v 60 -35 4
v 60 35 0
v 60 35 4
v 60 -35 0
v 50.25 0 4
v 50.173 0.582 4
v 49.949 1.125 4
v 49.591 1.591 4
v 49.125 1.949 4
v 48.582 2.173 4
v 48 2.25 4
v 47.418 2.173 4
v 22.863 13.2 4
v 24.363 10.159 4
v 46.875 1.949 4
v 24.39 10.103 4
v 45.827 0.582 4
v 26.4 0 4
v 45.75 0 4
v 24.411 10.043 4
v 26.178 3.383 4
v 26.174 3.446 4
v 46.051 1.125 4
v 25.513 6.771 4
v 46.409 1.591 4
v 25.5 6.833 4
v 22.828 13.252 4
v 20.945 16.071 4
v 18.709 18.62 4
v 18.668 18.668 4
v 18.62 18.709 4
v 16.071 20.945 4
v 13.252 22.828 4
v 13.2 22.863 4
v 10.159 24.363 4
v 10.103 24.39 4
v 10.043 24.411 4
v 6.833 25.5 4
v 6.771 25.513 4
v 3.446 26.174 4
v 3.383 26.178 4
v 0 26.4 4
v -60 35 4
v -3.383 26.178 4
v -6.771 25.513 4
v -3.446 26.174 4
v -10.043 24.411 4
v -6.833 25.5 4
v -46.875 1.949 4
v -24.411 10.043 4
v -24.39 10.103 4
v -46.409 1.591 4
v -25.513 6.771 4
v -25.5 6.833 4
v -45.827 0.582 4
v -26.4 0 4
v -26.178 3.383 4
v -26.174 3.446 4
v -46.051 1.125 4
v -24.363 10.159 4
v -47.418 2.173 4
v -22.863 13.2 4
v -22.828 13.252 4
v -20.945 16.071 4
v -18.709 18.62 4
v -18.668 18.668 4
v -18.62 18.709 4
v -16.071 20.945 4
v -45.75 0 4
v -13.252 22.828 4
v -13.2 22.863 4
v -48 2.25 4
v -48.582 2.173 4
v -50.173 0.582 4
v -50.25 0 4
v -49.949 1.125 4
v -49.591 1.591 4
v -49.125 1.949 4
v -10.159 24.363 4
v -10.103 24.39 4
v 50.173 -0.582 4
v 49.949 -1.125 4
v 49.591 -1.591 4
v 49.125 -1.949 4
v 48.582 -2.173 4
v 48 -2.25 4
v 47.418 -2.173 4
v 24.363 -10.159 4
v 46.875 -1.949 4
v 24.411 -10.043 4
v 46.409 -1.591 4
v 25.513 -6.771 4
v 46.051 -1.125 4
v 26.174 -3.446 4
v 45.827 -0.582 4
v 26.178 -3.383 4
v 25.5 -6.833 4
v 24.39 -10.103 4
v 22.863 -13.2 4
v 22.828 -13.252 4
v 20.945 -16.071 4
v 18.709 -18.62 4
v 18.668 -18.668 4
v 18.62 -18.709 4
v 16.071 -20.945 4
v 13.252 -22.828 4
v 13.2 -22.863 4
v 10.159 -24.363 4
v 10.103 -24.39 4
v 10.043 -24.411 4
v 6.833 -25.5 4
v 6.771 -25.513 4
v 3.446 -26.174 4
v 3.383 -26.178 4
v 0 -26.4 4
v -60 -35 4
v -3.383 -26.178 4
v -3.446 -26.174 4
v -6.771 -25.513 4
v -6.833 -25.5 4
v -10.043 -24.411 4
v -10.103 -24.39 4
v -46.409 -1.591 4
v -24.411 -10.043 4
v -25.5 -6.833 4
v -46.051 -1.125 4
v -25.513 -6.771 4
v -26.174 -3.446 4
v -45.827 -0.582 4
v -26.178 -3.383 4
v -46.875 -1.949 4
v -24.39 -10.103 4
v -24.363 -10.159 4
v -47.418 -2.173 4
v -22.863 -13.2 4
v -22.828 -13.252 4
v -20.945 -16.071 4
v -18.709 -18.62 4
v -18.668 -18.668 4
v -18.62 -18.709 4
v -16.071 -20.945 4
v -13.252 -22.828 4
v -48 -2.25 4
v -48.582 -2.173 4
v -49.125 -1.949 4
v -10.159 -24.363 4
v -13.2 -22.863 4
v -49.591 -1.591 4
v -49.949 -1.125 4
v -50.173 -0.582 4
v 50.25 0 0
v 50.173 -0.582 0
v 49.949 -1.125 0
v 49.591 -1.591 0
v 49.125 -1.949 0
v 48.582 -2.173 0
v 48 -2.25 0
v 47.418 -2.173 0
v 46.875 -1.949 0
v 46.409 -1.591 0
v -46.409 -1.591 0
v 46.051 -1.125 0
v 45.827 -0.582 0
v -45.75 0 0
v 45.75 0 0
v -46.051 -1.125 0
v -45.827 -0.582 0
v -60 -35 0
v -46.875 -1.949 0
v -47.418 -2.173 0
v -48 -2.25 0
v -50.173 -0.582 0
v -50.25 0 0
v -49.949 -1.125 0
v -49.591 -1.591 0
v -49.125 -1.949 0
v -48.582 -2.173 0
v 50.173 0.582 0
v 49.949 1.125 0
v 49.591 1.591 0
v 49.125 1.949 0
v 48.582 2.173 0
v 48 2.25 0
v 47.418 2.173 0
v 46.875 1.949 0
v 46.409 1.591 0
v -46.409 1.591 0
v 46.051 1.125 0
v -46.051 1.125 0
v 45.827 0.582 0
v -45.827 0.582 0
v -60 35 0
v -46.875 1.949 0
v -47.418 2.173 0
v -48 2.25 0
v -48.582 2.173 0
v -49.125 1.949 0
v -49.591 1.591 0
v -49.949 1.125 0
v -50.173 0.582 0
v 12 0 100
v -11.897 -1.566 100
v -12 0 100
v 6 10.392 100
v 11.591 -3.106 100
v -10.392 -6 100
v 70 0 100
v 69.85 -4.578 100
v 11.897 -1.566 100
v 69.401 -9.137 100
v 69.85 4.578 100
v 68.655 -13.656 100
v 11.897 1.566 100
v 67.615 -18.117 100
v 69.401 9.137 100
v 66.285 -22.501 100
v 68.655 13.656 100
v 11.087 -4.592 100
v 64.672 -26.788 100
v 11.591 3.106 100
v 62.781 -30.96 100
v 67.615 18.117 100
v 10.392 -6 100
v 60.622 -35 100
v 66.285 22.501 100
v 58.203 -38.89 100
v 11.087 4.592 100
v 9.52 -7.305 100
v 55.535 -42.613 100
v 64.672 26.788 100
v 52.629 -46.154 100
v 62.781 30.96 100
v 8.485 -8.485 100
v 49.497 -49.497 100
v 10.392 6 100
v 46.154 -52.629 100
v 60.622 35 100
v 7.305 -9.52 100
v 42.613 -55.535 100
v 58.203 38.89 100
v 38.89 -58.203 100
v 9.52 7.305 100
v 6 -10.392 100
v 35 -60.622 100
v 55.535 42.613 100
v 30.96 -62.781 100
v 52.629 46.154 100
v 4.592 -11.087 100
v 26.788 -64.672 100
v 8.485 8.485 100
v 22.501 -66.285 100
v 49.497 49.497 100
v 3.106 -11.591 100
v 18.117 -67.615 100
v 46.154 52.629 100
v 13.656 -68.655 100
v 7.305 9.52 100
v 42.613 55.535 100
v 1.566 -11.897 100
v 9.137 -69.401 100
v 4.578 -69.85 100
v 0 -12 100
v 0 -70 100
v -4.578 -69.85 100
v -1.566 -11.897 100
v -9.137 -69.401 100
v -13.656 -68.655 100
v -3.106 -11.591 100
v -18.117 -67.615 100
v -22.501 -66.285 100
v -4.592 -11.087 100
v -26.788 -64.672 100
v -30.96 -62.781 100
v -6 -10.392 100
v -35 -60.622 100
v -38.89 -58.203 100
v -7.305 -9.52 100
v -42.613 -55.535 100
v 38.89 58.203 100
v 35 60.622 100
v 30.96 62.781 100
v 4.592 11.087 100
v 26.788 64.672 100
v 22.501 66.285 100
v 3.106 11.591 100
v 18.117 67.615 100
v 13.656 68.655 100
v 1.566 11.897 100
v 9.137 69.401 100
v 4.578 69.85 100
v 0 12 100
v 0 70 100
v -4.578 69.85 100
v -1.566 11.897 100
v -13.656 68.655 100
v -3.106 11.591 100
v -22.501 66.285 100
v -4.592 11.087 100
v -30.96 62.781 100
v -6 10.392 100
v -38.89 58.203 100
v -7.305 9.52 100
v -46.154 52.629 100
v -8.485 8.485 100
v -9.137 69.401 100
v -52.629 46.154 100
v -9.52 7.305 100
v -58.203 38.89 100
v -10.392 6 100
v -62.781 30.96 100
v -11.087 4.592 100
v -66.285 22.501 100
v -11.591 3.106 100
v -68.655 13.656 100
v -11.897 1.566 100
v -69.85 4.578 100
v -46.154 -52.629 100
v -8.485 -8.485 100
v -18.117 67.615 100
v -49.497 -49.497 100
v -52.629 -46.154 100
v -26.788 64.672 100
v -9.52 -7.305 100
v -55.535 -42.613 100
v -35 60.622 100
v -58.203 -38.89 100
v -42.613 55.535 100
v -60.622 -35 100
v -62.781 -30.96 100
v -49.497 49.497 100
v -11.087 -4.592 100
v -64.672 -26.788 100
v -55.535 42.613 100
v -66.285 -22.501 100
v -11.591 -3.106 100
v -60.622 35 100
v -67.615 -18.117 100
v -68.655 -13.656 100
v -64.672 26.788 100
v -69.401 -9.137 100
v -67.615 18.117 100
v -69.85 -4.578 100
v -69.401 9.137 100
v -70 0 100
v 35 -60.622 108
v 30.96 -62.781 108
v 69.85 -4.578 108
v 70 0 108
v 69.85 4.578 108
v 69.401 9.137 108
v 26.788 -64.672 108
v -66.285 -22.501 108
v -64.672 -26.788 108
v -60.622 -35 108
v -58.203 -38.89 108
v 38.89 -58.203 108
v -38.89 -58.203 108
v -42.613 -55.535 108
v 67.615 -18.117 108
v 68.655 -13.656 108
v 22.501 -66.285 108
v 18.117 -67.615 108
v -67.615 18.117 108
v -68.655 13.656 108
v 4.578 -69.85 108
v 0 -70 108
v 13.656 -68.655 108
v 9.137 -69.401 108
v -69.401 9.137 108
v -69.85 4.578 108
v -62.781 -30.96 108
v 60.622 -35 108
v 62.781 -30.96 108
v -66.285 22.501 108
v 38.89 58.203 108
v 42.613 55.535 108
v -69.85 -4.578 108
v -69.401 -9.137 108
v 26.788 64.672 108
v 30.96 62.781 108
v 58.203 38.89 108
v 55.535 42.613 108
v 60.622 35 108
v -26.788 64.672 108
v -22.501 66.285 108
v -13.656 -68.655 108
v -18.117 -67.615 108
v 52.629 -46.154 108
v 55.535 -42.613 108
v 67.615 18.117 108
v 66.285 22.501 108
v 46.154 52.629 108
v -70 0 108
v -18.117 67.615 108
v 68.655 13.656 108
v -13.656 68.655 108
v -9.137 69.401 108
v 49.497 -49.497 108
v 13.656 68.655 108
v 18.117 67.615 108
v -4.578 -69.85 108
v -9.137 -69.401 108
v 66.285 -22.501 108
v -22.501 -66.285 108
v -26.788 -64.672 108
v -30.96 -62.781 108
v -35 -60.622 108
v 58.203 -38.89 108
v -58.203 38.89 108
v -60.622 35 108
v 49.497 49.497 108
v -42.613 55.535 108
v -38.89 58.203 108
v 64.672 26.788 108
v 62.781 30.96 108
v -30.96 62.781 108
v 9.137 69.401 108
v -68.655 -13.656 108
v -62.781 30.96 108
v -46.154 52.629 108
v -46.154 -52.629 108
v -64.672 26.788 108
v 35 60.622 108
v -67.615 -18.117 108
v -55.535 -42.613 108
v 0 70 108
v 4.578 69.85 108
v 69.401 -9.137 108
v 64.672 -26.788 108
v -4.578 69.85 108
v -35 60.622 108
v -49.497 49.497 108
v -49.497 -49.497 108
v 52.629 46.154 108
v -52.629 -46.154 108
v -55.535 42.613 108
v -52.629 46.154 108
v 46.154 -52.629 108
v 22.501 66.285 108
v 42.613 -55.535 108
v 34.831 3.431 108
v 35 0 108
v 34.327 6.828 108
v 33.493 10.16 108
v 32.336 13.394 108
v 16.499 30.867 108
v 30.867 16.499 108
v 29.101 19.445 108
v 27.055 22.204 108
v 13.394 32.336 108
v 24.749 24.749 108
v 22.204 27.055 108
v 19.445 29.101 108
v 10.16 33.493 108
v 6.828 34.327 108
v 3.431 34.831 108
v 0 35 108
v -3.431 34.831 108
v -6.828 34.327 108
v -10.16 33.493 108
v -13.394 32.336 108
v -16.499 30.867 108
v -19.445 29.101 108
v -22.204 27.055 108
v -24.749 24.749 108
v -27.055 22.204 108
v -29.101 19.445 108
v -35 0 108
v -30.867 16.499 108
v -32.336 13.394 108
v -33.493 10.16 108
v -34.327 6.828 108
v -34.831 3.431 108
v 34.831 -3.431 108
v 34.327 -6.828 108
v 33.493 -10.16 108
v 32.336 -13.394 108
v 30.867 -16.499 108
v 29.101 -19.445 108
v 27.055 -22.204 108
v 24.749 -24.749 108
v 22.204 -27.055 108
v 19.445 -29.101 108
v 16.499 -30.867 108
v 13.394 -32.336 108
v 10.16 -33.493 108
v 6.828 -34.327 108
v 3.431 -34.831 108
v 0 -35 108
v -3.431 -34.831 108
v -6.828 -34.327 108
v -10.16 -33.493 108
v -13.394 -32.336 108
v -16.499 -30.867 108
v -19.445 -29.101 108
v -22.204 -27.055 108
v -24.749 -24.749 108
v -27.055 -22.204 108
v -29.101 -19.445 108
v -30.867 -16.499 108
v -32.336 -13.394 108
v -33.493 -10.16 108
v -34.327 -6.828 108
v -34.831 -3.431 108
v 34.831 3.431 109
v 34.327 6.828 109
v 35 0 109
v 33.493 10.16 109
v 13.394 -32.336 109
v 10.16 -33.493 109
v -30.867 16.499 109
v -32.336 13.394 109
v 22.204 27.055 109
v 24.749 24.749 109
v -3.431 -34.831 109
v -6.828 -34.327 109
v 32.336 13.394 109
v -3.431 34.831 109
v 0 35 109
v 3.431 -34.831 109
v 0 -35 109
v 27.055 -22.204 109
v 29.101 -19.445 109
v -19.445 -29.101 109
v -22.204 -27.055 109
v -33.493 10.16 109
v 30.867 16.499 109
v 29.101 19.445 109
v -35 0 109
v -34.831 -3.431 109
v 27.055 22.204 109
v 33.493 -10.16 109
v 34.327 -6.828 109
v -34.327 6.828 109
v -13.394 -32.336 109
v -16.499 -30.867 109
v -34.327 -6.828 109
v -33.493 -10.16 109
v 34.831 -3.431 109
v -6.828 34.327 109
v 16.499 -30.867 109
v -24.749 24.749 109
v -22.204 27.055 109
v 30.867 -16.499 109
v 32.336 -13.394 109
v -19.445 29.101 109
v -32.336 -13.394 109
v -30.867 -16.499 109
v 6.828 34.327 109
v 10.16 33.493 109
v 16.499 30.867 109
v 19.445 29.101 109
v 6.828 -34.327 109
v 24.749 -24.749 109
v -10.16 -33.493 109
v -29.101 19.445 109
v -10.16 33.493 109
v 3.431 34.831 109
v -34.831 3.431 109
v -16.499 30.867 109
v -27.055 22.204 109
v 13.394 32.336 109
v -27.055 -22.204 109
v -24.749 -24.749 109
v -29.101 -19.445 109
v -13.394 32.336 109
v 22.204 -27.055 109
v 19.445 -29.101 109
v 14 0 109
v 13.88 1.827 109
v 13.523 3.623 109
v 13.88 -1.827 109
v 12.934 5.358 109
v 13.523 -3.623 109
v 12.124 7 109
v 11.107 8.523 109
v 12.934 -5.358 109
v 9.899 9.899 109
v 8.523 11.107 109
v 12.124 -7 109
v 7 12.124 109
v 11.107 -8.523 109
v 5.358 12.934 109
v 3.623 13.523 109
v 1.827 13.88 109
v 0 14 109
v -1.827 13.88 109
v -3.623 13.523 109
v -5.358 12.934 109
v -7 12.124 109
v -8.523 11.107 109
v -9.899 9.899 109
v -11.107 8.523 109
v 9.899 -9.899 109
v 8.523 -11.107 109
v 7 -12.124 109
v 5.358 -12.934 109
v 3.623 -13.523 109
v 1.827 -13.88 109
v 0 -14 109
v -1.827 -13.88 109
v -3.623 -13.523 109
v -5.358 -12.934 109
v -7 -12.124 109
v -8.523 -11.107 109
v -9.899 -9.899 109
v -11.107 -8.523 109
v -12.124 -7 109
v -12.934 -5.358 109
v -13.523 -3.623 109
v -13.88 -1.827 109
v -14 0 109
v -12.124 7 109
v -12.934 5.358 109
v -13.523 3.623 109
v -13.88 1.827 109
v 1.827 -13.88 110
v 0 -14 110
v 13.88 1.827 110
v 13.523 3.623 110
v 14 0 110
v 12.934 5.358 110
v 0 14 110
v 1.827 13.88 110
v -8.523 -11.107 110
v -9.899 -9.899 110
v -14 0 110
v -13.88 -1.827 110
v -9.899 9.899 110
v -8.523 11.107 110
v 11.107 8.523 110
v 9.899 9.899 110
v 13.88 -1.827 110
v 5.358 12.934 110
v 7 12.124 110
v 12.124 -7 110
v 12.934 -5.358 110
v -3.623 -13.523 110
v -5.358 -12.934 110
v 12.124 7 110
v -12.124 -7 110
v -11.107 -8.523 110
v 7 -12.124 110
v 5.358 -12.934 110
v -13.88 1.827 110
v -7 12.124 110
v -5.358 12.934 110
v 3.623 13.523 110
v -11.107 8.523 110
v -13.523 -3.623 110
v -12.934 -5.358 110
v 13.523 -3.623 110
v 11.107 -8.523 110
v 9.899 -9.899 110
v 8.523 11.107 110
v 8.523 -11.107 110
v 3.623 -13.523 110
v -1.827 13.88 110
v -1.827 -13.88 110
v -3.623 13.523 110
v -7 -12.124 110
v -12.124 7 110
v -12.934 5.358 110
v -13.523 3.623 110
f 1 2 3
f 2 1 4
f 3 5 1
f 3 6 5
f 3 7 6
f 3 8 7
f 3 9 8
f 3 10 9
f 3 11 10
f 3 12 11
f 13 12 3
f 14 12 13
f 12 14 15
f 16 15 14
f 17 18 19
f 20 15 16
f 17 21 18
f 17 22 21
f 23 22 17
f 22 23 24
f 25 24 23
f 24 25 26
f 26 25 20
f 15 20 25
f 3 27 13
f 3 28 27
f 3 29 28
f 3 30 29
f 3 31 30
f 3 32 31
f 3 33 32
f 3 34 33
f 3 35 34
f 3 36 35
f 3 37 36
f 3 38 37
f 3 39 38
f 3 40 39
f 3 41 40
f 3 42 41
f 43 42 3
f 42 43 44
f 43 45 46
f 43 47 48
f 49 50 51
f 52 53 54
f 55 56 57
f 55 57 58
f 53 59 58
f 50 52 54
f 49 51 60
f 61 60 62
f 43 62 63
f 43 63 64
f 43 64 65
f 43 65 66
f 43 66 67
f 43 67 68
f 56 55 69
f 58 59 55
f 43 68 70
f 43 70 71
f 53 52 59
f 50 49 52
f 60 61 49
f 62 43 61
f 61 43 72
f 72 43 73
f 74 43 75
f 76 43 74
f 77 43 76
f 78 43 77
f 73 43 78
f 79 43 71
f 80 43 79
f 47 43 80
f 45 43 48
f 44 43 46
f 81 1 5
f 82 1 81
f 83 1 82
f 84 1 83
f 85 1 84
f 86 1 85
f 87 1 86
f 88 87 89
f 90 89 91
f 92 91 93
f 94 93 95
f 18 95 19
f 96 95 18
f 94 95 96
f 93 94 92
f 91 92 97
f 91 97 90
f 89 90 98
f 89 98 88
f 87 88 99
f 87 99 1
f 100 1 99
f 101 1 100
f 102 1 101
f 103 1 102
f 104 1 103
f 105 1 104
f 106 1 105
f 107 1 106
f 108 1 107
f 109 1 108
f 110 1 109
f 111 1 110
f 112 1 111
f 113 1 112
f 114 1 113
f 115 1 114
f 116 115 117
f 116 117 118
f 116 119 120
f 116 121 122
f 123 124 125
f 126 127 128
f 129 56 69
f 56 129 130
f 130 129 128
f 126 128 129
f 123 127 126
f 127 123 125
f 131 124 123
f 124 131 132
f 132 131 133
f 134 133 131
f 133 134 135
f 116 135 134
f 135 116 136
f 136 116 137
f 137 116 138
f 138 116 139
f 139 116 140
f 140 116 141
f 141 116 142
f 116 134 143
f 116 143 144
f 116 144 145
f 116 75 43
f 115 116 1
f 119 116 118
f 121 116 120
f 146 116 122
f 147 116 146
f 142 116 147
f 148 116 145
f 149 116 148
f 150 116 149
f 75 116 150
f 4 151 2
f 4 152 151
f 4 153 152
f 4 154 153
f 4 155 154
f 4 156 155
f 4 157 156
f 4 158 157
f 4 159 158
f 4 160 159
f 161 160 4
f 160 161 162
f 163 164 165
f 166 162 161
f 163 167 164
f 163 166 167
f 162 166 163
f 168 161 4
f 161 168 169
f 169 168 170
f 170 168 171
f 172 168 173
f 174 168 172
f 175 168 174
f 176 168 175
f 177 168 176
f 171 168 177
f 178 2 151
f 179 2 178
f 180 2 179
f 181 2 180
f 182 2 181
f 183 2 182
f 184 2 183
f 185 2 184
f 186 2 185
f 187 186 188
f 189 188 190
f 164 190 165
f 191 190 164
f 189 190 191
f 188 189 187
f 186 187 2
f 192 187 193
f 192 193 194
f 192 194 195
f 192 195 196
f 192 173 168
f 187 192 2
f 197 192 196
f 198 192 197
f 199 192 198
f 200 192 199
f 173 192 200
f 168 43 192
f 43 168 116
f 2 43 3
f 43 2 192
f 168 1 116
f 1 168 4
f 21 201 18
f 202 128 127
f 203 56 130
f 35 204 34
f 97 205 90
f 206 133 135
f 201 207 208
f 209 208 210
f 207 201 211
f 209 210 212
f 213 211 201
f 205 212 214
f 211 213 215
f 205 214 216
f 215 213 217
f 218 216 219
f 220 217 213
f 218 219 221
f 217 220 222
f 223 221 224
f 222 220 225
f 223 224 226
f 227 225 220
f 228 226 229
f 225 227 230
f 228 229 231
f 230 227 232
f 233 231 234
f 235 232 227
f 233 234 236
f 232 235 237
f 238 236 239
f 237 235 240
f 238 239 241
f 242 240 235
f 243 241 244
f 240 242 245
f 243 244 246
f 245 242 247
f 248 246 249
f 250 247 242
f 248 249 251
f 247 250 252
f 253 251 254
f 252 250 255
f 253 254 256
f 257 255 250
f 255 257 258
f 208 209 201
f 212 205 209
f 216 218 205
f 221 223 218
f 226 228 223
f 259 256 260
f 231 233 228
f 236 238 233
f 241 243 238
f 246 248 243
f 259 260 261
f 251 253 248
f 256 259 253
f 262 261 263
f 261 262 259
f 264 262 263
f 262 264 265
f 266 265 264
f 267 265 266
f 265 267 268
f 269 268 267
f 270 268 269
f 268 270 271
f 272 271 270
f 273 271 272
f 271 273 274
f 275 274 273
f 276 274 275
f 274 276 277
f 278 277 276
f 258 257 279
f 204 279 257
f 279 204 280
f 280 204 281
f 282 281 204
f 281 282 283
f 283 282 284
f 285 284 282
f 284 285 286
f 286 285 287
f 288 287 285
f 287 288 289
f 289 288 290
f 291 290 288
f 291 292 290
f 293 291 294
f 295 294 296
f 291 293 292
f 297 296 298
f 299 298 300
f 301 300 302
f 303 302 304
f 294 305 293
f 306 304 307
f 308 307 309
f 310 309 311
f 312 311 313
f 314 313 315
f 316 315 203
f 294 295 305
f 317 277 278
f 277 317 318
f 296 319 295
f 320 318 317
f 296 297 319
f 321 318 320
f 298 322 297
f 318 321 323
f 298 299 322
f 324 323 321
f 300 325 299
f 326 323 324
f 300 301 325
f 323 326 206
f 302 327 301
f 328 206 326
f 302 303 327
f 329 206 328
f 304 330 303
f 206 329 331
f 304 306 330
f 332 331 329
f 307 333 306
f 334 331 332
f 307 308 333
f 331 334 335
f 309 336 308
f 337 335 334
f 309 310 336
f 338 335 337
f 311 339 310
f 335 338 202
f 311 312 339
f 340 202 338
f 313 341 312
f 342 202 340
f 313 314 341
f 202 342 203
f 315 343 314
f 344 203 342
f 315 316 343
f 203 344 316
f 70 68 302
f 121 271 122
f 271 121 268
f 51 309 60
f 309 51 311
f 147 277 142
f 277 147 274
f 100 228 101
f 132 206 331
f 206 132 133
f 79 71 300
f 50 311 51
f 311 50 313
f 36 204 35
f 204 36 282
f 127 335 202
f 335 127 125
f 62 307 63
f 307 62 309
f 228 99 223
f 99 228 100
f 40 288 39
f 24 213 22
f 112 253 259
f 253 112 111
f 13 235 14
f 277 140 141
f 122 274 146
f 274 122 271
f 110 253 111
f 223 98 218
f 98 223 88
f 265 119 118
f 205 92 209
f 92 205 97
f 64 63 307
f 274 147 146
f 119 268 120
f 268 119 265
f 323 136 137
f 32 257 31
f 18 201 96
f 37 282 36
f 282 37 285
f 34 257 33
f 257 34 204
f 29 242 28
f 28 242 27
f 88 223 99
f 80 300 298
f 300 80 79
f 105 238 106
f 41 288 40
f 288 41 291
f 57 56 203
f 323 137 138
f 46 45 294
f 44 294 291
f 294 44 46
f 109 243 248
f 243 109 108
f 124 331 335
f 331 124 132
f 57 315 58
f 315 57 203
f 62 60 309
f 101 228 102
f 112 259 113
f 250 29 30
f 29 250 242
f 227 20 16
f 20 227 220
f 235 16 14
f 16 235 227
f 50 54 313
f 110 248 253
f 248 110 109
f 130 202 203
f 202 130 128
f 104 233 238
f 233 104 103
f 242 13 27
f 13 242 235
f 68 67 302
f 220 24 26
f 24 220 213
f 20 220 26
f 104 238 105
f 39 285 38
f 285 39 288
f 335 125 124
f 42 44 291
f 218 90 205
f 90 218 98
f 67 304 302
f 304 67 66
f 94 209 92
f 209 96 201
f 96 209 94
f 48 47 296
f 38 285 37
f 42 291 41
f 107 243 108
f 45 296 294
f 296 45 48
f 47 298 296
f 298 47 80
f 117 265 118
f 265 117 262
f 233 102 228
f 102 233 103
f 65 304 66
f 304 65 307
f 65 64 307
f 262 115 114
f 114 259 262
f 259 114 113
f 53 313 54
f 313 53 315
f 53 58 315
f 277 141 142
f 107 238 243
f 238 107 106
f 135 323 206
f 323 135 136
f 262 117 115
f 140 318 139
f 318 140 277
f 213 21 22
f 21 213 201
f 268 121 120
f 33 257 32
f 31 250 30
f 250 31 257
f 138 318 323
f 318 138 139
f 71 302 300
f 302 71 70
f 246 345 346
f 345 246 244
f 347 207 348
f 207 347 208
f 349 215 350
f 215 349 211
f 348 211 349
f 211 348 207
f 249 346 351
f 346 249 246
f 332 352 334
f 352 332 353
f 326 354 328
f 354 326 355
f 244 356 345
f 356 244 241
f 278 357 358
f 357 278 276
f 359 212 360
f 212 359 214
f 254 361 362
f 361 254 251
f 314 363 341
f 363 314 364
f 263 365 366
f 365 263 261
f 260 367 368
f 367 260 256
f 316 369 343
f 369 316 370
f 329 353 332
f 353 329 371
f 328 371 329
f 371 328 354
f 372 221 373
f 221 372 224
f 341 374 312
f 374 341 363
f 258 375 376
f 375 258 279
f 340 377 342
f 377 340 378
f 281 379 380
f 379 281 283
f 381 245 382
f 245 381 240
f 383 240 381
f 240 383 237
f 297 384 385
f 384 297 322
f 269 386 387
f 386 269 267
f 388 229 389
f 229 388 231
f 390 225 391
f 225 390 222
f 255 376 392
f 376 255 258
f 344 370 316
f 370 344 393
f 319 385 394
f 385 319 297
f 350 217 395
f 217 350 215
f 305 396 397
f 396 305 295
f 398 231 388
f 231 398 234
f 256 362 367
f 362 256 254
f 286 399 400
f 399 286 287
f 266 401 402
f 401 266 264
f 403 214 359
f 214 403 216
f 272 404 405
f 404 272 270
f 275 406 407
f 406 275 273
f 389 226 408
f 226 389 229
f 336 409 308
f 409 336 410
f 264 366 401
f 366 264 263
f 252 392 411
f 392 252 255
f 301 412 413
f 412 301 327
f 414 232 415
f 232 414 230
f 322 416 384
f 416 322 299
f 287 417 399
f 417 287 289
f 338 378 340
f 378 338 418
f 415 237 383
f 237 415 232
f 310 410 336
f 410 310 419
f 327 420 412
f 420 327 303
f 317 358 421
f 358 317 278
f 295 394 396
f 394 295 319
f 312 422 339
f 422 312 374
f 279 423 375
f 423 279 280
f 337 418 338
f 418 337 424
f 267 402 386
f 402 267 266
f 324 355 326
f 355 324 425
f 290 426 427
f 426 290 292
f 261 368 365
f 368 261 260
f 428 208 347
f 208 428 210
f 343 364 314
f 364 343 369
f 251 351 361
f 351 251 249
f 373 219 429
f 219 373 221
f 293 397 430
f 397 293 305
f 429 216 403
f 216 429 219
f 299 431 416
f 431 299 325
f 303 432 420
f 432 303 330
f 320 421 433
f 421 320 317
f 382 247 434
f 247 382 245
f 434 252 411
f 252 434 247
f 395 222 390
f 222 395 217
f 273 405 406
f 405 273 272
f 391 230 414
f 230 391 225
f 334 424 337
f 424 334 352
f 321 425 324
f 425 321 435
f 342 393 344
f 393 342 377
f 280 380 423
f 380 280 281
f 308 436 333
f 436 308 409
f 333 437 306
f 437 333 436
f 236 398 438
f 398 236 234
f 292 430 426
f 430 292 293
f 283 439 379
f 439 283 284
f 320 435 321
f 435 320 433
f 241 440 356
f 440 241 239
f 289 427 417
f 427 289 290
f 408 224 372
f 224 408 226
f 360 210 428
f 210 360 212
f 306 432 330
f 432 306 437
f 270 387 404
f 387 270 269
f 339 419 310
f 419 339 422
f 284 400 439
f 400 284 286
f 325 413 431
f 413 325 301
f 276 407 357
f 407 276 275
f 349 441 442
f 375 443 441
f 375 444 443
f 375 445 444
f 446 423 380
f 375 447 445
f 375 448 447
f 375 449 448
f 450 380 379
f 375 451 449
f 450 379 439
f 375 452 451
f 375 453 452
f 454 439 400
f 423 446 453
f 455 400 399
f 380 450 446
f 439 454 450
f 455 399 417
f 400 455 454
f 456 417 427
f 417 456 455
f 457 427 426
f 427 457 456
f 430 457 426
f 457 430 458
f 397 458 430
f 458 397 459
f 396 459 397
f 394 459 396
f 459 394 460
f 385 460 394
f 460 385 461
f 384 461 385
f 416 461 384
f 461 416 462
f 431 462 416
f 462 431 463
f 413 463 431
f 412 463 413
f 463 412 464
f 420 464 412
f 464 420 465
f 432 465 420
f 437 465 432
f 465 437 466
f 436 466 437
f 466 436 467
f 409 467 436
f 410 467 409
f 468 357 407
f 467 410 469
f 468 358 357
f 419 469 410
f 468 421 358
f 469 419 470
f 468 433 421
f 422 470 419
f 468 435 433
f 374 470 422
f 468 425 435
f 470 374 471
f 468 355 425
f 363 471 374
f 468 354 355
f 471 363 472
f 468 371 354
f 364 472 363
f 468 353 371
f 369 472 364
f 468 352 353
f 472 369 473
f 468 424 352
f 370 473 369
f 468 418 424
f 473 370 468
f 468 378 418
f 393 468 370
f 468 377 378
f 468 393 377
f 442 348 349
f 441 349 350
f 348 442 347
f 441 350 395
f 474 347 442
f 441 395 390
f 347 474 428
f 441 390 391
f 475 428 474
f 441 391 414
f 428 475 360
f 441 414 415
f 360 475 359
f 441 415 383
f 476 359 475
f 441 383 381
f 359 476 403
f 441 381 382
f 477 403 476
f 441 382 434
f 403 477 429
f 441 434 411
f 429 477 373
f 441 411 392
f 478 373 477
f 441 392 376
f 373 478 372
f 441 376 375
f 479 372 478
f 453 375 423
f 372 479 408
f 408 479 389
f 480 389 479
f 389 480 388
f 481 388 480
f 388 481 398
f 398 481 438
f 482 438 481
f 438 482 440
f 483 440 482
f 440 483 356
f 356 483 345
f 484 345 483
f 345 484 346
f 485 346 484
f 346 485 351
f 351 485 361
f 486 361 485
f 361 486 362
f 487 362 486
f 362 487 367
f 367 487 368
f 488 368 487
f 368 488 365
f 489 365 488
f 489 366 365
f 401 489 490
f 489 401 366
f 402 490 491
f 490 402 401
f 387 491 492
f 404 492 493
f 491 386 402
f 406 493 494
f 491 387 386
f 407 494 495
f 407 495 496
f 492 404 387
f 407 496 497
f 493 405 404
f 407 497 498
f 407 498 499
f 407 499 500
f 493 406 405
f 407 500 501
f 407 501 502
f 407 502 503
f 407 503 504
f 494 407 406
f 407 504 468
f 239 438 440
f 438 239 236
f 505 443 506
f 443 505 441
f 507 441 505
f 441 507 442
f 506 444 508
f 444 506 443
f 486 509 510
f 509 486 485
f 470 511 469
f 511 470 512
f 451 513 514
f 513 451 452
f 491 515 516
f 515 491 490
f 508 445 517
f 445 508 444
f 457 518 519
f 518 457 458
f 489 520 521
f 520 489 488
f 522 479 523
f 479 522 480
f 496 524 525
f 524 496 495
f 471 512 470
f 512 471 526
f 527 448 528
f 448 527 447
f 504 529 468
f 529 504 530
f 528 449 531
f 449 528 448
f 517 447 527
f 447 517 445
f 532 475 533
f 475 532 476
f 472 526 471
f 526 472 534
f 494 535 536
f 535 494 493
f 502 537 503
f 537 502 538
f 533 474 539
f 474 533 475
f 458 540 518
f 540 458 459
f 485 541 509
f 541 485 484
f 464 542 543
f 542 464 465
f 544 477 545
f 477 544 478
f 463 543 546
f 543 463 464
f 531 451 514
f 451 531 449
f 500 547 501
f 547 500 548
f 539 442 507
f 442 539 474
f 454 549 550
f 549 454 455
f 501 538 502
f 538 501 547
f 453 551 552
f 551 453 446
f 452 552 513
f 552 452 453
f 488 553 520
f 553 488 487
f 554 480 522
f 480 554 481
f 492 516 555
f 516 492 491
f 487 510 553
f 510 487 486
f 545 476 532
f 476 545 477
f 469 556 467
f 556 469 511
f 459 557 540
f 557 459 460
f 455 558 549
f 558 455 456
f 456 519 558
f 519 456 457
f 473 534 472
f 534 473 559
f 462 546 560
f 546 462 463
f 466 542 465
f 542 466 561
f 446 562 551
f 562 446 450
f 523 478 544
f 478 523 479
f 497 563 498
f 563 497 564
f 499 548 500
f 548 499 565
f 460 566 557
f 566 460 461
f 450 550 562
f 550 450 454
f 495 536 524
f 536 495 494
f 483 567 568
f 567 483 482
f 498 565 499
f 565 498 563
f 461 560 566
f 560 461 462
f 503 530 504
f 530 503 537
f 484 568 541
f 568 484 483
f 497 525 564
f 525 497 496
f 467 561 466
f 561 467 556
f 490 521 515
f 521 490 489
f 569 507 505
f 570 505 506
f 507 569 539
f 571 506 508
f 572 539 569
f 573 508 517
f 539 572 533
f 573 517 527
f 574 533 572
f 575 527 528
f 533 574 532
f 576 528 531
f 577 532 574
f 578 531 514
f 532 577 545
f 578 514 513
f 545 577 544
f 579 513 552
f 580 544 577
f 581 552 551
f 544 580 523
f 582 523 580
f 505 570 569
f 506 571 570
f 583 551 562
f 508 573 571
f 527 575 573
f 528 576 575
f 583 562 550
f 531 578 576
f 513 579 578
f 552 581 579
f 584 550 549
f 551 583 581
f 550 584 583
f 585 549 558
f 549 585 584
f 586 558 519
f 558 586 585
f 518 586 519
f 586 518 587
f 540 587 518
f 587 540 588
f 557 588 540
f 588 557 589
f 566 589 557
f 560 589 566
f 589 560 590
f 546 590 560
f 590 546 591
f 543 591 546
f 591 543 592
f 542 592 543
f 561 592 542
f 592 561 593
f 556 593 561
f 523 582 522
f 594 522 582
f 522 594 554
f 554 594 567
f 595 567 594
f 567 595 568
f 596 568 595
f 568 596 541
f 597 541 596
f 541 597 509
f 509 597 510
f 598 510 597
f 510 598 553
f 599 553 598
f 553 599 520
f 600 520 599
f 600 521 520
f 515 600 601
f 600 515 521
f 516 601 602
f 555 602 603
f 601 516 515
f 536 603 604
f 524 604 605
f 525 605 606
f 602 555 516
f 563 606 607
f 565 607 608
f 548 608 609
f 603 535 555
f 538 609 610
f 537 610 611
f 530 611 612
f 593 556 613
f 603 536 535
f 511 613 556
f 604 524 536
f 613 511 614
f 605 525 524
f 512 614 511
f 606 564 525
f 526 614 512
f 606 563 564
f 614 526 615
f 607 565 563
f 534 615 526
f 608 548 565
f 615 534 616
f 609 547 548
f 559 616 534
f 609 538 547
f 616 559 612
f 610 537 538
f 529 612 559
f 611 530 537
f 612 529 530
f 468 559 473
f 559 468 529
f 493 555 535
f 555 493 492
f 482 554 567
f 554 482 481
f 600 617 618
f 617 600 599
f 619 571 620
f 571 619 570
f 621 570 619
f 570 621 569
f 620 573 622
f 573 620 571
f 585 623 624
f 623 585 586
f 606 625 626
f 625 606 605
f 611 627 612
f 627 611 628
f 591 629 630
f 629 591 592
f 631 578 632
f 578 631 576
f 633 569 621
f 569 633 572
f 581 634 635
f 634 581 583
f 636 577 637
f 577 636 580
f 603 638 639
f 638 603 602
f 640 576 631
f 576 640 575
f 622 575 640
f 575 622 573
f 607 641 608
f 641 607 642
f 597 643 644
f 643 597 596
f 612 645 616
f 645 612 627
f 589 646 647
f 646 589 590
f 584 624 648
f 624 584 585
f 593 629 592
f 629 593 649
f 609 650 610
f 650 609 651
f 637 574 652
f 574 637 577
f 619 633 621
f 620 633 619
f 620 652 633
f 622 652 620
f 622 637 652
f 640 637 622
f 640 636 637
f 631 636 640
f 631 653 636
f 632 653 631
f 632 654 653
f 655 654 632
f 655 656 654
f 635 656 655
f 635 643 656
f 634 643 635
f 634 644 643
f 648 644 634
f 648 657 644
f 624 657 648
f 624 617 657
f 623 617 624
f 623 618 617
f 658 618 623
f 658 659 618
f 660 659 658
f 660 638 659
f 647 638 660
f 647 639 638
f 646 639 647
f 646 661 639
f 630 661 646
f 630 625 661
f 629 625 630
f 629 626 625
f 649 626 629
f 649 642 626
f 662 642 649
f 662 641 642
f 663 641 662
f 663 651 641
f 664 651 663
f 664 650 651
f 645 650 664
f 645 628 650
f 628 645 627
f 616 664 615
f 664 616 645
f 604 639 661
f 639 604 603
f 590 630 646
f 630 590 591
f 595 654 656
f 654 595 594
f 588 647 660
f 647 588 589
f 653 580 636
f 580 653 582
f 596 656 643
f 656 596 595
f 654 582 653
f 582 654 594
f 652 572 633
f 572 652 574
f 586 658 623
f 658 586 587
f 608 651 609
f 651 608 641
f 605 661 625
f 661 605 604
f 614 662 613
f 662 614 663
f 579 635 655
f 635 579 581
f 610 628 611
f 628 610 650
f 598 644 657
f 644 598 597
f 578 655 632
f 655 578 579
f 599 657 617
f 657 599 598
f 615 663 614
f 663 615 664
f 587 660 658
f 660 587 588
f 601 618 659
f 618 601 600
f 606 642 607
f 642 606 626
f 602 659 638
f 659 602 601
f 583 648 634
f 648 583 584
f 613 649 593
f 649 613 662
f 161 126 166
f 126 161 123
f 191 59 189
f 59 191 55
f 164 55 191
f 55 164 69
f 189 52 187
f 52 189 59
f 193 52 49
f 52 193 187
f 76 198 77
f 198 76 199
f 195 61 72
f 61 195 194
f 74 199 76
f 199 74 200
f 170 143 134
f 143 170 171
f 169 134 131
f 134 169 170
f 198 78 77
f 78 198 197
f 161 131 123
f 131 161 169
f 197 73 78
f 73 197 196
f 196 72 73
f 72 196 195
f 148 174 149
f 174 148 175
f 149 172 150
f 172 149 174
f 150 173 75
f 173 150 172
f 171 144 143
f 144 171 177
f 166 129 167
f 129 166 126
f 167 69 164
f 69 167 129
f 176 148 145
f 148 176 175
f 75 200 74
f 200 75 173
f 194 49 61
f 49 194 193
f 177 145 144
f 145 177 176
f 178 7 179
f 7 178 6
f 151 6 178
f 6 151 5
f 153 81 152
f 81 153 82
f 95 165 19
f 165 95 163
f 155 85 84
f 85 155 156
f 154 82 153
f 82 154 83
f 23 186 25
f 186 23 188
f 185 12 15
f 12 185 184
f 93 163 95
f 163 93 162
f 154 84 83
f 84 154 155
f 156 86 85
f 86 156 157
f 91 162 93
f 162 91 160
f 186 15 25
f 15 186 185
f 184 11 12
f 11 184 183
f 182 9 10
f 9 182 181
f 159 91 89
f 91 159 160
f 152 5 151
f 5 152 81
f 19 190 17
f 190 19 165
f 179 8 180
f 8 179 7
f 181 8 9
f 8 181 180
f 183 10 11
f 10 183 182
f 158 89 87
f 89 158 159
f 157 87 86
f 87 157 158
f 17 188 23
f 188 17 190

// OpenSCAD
// file: ../models/drone-playground-bullseye-pedestal/model.scad
platform_diameter=140; landing_height=100; platform_thickness=8; base_length=120; base_depth=70; mount_hole_diameter=4.5;
module bullseye_pedestal(){ difference(){ union(){ translate([-base_length/2,-base_depth/2,0]) cube([base_length,base_depth,4]); cylinder(d1=54,d2=24,h=landing_height,$fn=48); translate([0,0,landing_height]) cylinder(d=platform_diameter,h=platform_thickness,$fn=96); translate([0,0,landing_height+platform_thickness]) cylinder(d=70,h=1,$fn=64); translate([0,0,landing_height+platform_thickness+1]) cylinder(d=28,h=1,$fn=48); } for(x=[-48,48]) translate([x,0,-1]) cylinder(d=mount_hole_diameter,h=7,$fn=24); }}
assert(platform_diameter==140 && landing_height==100); echo("SCADCTL_REQUIREMENT:parameters:PASS"); bullseye_pedestal();
// main file
use <../models/drone-playground-bullseye-pedestal/model.scad>
color("crimson") bullseye_pedestal();
